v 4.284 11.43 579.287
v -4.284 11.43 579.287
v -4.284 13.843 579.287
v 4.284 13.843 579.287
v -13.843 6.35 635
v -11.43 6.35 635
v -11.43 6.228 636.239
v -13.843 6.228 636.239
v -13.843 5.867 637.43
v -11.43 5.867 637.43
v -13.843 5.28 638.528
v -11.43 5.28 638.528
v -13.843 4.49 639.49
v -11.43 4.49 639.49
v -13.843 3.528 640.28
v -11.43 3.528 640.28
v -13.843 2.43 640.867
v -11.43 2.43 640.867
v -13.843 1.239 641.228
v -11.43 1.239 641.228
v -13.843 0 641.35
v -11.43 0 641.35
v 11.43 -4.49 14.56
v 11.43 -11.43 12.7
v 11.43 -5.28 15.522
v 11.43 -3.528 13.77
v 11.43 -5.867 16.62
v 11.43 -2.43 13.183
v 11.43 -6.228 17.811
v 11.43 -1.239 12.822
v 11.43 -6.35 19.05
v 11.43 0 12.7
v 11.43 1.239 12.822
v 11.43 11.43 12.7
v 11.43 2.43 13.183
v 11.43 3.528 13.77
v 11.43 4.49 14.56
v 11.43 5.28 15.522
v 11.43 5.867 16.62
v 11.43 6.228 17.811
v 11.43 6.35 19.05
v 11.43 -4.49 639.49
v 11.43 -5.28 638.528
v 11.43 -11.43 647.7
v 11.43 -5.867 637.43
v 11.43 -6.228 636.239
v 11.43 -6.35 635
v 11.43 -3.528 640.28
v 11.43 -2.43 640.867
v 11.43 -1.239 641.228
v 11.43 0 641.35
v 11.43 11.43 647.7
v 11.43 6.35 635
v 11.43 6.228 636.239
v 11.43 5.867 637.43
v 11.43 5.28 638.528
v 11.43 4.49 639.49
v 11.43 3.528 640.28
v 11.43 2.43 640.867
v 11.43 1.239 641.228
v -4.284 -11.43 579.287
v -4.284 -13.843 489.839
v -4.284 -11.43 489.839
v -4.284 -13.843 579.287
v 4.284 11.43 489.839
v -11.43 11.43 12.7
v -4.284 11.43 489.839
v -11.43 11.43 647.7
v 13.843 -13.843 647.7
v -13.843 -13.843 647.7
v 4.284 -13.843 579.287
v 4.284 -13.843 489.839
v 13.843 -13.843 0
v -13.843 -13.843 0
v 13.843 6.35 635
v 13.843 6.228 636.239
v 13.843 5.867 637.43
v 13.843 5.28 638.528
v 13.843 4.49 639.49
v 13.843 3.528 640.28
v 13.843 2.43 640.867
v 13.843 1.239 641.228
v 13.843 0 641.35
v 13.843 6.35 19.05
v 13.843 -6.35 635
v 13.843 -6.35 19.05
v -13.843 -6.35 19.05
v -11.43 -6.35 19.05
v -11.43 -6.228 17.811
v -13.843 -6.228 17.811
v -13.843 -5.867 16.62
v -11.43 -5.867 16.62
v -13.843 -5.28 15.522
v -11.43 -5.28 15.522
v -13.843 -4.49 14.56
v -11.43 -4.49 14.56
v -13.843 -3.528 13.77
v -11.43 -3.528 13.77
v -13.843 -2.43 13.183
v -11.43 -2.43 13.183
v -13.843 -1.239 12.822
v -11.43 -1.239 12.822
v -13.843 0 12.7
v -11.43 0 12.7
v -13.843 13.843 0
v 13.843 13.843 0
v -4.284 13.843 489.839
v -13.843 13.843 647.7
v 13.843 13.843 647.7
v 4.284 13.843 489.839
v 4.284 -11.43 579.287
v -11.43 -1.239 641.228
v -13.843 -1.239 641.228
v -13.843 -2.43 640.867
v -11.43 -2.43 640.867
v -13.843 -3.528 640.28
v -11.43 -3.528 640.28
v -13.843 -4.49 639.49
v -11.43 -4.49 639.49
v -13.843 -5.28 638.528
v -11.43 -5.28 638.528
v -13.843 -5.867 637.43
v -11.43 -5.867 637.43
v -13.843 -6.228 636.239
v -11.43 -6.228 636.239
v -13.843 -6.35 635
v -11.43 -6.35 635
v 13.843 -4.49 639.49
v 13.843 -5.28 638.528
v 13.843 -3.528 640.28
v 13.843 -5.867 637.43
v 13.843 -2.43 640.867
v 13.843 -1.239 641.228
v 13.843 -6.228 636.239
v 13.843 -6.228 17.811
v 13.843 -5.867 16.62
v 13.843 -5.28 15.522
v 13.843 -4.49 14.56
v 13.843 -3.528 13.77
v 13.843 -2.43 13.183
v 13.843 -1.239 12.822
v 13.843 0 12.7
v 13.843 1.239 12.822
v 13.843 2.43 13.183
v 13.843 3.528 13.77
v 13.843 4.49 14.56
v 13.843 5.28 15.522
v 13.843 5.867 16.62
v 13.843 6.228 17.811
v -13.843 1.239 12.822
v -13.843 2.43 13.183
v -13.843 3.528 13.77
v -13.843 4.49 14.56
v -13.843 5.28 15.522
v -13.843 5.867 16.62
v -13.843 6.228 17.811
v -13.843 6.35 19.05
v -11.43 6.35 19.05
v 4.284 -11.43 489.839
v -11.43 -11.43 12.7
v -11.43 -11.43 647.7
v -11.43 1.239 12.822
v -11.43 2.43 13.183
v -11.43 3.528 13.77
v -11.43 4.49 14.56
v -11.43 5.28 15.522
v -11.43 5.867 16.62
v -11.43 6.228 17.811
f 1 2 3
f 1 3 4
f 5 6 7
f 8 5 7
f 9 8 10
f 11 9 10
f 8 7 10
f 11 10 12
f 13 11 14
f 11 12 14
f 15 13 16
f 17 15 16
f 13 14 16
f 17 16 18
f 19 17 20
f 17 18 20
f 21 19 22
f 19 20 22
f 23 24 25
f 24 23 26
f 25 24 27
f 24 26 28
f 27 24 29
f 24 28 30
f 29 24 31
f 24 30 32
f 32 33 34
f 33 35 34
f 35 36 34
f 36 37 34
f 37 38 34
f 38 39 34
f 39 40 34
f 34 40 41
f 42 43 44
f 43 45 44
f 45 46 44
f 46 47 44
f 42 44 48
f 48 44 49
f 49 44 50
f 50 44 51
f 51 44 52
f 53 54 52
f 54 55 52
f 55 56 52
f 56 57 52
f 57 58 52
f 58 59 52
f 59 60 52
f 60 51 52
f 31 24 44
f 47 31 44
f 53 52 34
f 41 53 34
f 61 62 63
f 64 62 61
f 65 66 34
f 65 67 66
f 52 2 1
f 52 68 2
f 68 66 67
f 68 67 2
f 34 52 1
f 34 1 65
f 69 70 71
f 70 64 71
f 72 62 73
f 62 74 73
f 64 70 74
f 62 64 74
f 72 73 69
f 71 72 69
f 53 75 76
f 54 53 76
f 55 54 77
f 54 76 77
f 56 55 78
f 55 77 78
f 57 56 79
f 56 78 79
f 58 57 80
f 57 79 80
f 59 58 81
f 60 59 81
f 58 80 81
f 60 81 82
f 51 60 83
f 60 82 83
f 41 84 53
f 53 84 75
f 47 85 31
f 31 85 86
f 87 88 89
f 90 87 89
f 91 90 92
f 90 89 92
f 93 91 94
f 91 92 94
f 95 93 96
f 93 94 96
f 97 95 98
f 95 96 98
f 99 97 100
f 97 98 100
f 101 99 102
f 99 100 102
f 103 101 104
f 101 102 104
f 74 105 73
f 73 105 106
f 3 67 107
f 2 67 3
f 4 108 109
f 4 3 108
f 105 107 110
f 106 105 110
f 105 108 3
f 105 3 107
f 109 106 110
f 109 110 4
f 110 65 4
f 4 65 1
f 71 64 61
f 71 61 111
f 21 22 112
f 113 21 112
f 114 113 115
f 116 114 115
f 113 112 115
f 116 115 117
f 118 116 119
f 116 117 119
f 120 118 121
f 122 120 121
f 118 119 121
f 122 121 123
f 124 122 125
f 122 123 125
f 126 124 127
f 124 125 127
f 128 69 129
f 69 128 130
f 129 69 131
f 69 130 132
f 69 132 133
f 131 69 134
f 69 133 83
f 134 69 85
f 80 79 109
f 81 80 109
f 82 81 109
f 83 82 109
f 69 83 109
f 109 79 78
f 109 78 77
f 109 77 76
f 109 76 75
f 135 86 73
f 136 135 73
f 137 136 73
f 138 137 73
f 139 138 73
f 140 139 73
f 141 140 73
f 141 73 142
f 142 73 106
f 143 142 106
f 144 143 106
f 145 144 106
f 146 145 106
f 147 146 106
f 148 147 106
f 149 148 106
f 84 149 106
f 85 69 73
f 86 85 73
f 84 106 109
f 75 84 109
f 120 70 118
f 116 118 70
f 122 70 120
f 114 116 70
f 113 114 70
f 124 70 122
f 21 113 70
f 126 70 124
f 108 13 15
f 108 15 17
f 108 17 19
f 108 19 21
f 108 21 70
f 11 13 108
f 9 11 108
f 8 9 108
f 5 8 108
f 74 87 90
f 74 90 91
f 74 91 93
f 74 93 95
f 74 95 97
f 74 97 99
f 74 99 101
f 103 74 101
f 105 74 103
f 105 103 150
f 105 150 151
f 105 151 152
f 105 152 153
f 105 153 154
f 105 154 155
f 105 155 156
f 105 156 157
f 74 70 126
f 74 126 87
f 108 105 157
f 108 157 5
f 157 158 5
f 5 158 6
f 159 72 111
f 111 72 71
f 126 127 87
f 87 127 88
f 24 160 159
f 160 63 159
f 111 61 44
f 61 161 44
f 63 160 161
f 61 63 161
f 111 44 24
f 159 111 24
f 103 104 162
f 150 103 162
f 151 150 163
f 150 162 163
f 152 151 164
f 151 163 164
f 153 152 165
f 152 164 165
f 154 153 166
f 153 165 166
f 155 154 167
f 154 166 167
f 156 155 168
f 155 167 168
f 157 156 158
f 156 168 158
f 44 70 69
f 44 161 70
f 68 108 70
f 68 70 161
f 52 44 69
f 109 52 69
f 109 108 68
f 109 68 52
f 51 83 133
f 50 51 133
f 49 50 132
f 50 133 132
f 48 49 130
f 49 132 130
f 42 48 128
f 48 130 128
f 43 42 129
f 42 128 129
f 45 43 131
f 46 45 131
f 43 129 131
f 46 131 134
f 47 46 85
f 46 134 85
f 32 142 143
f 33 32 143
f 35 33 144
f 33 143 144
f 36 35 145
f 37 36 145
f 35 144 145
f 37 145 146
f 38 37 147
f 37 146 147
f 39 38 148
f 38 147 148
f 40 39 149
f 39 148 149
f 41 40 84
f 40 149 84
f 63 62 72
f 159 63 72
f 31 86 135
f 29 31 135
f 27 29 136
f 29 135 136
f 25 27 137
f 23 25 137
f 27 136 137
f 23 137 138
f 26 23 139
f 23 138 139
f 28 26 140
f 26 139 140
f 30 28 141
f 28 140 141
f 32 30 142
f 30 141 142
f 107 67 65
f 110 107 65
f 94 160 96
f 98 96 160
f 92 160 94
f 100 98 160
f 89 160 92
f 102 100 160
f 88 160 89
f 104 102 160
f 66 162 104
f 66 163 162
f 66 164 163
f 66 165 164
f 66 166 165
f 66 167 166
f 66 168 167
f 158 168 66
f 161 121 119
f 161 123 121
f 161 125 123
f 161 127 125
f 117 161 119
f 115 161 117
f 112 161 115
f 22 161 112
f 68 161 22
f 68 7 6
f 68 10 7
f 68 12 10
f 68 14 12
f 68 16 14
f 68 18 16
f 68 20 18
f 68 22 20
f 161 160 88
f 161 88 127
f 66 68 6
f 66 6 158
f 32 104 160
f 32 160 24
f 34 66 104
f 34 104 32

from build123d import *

# Parameters (mm, degrees)
F0_W     = 27.686
F0_H     = 27.686
F1_DEPTH = 647.7
F2_W     = 22.86
F2_H     = 22.86
F3_DEPTH = 635
F5_DEPTH = 56.134
F6_W     = 8.5673183203
F6_H     = 89.4483327866
F7_DEPTH = 68.326


with BuildPart() as f1:
    # F0 (on Top) → F1 (new body)
    with BuildSketch(Plane.XY):
        Rectangle(F0_W, F0_H)
    extrude(amount=F1_DEPTH)

    # F2 (on face) → F3 (cut)
    with BuildSketch(Plane.XY.offset(647.7)):
        Rectangle(F2_W, F2_H)
    extrude(amount=-F3_DEPTH, mode=Mode.SUBTRACT)

    # F4 (on face) → F5 (cut)
    with BuildSketch(Plane.YZ.offset(13.843)):
        with BuildLine():
            ThreePointArc((0, 628.65), (-4.4901280605, 630.5098719395), (-6.35, 635))
            Line((-6.35, 635), (-6.35, 323.85))
            Line((-6.35, 323.85), (0, 323.85))
            Line((0, 323.85), (0, 628.65))
        make_face()
        with BuildLine():
            Line((0, 628.65), (0, 635))
            Line((0, 635), (-6.35, 635))
            ThreePointArc((-6.35, 635), (-4.4901280605, 630.5098719395), (0, 628.65))
        make_face()
        with BuildLine():
            Line((0, 635), (0, 641.35))
            ThreePointArc((0, 641.35), (-4.4901280605, 639.4901280605), (-6.35, 635))
            Line((-6.35, 635), (0, 635))
        make_face()
        with BuildLine():
            ThreePointArc((6.35, 635), (4.4901280605, 639.4901280605), (0, 641.35))
            Line((0, 641.35), (0, 635))
            Line((0, 635), (6.35, 635))
        make_face()
        with BuildLine():
            Line((6.35, 635), (0, 635))
            Line((0, 635), (0, 628.65))
            ThreePointArc((0, 628.65), (4.4901280605, 630.5098719395), (6.35, 635))
        make_face()
        with BuildLine():
            Line((6.35, 323.85), (6.35, 635))
            ThreePointArc((6.35, 635), (4.4901280605, 630.5098719395), (0, 628.65))
            Line((0, 628.65), (0, 323.85))
            Line((0, 323.85), (6.35, 323.85))
        make_face()
        with BuildLine():
            Line((0, 323.85), (-6.35, 323.85))
            Line((-6.35, 323.85), (-6.35, 19.05))
            ThreePointArc((-6.35, 19.05), (-4.4901280605, 23.5401280605), (0, 25.4))
            Line((0, 25.4), (0, 323.85))
        make_face()
        with BuildLine():
            Line((6.35, 19.05), (6.35, 323.85))
            Line((6.35, 323.85), (0, 323.85))
            Line((0, 323.85), (0, 25.4))
            ThreePointArc((0, 25.4), (4.4901280605, 23.5401280605), (6.35, 19.05))
        make_face()
        with BuildLine():
            ThreePointArc((0, 12.7), (4.4901280605, 14.5598719395), (6.35, 19.05))
            Line((6.35, 19.05), (0, 19.05))
            Line((0, 19.05), (0, 12.7))
        make_face()
        with BuildLine():
            Line((0, 19.05), (-6.35, 19.05))
            ThreePointArc((-6.35, 19.05), (-4.4901280605, 14.5598719395), (0, 12.7))
            Line((0, 12.7), (0, 19.05))
        make_face()
        with BuildLine():
            ThreePointArc((0, 25.4), (-4.4901280605, 23.5401280605), (-6.35, 19.05))
            Line((-6.35, 19.05), (0, 19.05))
            Line((0, 19.05), (0, 25.4))
        make_face()
        with BuildLine():
            Line((0, 19.05), (6.35, 19.05))
            ThreePointArc((6.35, 19.05), (4.4901280605, 23.5401280605), (0, 25.4))
            Line((0, 25.4), (0, 19.05))
        make_face()
    extrude(amount=-F5_DEPTH, mode=Mode.SUBTRACT)

    # F6 (on face) → F7 (cut)
    with BuildSketch(Plane.XZ.offset(13.843)):
        with Locations((0, 534.5633029938)):
            Rectangle(F6_W, F6_H)
    extrude(amount=-F7_DEPTH, mode=Mode.SUBTRACT)


solid = f1.part
